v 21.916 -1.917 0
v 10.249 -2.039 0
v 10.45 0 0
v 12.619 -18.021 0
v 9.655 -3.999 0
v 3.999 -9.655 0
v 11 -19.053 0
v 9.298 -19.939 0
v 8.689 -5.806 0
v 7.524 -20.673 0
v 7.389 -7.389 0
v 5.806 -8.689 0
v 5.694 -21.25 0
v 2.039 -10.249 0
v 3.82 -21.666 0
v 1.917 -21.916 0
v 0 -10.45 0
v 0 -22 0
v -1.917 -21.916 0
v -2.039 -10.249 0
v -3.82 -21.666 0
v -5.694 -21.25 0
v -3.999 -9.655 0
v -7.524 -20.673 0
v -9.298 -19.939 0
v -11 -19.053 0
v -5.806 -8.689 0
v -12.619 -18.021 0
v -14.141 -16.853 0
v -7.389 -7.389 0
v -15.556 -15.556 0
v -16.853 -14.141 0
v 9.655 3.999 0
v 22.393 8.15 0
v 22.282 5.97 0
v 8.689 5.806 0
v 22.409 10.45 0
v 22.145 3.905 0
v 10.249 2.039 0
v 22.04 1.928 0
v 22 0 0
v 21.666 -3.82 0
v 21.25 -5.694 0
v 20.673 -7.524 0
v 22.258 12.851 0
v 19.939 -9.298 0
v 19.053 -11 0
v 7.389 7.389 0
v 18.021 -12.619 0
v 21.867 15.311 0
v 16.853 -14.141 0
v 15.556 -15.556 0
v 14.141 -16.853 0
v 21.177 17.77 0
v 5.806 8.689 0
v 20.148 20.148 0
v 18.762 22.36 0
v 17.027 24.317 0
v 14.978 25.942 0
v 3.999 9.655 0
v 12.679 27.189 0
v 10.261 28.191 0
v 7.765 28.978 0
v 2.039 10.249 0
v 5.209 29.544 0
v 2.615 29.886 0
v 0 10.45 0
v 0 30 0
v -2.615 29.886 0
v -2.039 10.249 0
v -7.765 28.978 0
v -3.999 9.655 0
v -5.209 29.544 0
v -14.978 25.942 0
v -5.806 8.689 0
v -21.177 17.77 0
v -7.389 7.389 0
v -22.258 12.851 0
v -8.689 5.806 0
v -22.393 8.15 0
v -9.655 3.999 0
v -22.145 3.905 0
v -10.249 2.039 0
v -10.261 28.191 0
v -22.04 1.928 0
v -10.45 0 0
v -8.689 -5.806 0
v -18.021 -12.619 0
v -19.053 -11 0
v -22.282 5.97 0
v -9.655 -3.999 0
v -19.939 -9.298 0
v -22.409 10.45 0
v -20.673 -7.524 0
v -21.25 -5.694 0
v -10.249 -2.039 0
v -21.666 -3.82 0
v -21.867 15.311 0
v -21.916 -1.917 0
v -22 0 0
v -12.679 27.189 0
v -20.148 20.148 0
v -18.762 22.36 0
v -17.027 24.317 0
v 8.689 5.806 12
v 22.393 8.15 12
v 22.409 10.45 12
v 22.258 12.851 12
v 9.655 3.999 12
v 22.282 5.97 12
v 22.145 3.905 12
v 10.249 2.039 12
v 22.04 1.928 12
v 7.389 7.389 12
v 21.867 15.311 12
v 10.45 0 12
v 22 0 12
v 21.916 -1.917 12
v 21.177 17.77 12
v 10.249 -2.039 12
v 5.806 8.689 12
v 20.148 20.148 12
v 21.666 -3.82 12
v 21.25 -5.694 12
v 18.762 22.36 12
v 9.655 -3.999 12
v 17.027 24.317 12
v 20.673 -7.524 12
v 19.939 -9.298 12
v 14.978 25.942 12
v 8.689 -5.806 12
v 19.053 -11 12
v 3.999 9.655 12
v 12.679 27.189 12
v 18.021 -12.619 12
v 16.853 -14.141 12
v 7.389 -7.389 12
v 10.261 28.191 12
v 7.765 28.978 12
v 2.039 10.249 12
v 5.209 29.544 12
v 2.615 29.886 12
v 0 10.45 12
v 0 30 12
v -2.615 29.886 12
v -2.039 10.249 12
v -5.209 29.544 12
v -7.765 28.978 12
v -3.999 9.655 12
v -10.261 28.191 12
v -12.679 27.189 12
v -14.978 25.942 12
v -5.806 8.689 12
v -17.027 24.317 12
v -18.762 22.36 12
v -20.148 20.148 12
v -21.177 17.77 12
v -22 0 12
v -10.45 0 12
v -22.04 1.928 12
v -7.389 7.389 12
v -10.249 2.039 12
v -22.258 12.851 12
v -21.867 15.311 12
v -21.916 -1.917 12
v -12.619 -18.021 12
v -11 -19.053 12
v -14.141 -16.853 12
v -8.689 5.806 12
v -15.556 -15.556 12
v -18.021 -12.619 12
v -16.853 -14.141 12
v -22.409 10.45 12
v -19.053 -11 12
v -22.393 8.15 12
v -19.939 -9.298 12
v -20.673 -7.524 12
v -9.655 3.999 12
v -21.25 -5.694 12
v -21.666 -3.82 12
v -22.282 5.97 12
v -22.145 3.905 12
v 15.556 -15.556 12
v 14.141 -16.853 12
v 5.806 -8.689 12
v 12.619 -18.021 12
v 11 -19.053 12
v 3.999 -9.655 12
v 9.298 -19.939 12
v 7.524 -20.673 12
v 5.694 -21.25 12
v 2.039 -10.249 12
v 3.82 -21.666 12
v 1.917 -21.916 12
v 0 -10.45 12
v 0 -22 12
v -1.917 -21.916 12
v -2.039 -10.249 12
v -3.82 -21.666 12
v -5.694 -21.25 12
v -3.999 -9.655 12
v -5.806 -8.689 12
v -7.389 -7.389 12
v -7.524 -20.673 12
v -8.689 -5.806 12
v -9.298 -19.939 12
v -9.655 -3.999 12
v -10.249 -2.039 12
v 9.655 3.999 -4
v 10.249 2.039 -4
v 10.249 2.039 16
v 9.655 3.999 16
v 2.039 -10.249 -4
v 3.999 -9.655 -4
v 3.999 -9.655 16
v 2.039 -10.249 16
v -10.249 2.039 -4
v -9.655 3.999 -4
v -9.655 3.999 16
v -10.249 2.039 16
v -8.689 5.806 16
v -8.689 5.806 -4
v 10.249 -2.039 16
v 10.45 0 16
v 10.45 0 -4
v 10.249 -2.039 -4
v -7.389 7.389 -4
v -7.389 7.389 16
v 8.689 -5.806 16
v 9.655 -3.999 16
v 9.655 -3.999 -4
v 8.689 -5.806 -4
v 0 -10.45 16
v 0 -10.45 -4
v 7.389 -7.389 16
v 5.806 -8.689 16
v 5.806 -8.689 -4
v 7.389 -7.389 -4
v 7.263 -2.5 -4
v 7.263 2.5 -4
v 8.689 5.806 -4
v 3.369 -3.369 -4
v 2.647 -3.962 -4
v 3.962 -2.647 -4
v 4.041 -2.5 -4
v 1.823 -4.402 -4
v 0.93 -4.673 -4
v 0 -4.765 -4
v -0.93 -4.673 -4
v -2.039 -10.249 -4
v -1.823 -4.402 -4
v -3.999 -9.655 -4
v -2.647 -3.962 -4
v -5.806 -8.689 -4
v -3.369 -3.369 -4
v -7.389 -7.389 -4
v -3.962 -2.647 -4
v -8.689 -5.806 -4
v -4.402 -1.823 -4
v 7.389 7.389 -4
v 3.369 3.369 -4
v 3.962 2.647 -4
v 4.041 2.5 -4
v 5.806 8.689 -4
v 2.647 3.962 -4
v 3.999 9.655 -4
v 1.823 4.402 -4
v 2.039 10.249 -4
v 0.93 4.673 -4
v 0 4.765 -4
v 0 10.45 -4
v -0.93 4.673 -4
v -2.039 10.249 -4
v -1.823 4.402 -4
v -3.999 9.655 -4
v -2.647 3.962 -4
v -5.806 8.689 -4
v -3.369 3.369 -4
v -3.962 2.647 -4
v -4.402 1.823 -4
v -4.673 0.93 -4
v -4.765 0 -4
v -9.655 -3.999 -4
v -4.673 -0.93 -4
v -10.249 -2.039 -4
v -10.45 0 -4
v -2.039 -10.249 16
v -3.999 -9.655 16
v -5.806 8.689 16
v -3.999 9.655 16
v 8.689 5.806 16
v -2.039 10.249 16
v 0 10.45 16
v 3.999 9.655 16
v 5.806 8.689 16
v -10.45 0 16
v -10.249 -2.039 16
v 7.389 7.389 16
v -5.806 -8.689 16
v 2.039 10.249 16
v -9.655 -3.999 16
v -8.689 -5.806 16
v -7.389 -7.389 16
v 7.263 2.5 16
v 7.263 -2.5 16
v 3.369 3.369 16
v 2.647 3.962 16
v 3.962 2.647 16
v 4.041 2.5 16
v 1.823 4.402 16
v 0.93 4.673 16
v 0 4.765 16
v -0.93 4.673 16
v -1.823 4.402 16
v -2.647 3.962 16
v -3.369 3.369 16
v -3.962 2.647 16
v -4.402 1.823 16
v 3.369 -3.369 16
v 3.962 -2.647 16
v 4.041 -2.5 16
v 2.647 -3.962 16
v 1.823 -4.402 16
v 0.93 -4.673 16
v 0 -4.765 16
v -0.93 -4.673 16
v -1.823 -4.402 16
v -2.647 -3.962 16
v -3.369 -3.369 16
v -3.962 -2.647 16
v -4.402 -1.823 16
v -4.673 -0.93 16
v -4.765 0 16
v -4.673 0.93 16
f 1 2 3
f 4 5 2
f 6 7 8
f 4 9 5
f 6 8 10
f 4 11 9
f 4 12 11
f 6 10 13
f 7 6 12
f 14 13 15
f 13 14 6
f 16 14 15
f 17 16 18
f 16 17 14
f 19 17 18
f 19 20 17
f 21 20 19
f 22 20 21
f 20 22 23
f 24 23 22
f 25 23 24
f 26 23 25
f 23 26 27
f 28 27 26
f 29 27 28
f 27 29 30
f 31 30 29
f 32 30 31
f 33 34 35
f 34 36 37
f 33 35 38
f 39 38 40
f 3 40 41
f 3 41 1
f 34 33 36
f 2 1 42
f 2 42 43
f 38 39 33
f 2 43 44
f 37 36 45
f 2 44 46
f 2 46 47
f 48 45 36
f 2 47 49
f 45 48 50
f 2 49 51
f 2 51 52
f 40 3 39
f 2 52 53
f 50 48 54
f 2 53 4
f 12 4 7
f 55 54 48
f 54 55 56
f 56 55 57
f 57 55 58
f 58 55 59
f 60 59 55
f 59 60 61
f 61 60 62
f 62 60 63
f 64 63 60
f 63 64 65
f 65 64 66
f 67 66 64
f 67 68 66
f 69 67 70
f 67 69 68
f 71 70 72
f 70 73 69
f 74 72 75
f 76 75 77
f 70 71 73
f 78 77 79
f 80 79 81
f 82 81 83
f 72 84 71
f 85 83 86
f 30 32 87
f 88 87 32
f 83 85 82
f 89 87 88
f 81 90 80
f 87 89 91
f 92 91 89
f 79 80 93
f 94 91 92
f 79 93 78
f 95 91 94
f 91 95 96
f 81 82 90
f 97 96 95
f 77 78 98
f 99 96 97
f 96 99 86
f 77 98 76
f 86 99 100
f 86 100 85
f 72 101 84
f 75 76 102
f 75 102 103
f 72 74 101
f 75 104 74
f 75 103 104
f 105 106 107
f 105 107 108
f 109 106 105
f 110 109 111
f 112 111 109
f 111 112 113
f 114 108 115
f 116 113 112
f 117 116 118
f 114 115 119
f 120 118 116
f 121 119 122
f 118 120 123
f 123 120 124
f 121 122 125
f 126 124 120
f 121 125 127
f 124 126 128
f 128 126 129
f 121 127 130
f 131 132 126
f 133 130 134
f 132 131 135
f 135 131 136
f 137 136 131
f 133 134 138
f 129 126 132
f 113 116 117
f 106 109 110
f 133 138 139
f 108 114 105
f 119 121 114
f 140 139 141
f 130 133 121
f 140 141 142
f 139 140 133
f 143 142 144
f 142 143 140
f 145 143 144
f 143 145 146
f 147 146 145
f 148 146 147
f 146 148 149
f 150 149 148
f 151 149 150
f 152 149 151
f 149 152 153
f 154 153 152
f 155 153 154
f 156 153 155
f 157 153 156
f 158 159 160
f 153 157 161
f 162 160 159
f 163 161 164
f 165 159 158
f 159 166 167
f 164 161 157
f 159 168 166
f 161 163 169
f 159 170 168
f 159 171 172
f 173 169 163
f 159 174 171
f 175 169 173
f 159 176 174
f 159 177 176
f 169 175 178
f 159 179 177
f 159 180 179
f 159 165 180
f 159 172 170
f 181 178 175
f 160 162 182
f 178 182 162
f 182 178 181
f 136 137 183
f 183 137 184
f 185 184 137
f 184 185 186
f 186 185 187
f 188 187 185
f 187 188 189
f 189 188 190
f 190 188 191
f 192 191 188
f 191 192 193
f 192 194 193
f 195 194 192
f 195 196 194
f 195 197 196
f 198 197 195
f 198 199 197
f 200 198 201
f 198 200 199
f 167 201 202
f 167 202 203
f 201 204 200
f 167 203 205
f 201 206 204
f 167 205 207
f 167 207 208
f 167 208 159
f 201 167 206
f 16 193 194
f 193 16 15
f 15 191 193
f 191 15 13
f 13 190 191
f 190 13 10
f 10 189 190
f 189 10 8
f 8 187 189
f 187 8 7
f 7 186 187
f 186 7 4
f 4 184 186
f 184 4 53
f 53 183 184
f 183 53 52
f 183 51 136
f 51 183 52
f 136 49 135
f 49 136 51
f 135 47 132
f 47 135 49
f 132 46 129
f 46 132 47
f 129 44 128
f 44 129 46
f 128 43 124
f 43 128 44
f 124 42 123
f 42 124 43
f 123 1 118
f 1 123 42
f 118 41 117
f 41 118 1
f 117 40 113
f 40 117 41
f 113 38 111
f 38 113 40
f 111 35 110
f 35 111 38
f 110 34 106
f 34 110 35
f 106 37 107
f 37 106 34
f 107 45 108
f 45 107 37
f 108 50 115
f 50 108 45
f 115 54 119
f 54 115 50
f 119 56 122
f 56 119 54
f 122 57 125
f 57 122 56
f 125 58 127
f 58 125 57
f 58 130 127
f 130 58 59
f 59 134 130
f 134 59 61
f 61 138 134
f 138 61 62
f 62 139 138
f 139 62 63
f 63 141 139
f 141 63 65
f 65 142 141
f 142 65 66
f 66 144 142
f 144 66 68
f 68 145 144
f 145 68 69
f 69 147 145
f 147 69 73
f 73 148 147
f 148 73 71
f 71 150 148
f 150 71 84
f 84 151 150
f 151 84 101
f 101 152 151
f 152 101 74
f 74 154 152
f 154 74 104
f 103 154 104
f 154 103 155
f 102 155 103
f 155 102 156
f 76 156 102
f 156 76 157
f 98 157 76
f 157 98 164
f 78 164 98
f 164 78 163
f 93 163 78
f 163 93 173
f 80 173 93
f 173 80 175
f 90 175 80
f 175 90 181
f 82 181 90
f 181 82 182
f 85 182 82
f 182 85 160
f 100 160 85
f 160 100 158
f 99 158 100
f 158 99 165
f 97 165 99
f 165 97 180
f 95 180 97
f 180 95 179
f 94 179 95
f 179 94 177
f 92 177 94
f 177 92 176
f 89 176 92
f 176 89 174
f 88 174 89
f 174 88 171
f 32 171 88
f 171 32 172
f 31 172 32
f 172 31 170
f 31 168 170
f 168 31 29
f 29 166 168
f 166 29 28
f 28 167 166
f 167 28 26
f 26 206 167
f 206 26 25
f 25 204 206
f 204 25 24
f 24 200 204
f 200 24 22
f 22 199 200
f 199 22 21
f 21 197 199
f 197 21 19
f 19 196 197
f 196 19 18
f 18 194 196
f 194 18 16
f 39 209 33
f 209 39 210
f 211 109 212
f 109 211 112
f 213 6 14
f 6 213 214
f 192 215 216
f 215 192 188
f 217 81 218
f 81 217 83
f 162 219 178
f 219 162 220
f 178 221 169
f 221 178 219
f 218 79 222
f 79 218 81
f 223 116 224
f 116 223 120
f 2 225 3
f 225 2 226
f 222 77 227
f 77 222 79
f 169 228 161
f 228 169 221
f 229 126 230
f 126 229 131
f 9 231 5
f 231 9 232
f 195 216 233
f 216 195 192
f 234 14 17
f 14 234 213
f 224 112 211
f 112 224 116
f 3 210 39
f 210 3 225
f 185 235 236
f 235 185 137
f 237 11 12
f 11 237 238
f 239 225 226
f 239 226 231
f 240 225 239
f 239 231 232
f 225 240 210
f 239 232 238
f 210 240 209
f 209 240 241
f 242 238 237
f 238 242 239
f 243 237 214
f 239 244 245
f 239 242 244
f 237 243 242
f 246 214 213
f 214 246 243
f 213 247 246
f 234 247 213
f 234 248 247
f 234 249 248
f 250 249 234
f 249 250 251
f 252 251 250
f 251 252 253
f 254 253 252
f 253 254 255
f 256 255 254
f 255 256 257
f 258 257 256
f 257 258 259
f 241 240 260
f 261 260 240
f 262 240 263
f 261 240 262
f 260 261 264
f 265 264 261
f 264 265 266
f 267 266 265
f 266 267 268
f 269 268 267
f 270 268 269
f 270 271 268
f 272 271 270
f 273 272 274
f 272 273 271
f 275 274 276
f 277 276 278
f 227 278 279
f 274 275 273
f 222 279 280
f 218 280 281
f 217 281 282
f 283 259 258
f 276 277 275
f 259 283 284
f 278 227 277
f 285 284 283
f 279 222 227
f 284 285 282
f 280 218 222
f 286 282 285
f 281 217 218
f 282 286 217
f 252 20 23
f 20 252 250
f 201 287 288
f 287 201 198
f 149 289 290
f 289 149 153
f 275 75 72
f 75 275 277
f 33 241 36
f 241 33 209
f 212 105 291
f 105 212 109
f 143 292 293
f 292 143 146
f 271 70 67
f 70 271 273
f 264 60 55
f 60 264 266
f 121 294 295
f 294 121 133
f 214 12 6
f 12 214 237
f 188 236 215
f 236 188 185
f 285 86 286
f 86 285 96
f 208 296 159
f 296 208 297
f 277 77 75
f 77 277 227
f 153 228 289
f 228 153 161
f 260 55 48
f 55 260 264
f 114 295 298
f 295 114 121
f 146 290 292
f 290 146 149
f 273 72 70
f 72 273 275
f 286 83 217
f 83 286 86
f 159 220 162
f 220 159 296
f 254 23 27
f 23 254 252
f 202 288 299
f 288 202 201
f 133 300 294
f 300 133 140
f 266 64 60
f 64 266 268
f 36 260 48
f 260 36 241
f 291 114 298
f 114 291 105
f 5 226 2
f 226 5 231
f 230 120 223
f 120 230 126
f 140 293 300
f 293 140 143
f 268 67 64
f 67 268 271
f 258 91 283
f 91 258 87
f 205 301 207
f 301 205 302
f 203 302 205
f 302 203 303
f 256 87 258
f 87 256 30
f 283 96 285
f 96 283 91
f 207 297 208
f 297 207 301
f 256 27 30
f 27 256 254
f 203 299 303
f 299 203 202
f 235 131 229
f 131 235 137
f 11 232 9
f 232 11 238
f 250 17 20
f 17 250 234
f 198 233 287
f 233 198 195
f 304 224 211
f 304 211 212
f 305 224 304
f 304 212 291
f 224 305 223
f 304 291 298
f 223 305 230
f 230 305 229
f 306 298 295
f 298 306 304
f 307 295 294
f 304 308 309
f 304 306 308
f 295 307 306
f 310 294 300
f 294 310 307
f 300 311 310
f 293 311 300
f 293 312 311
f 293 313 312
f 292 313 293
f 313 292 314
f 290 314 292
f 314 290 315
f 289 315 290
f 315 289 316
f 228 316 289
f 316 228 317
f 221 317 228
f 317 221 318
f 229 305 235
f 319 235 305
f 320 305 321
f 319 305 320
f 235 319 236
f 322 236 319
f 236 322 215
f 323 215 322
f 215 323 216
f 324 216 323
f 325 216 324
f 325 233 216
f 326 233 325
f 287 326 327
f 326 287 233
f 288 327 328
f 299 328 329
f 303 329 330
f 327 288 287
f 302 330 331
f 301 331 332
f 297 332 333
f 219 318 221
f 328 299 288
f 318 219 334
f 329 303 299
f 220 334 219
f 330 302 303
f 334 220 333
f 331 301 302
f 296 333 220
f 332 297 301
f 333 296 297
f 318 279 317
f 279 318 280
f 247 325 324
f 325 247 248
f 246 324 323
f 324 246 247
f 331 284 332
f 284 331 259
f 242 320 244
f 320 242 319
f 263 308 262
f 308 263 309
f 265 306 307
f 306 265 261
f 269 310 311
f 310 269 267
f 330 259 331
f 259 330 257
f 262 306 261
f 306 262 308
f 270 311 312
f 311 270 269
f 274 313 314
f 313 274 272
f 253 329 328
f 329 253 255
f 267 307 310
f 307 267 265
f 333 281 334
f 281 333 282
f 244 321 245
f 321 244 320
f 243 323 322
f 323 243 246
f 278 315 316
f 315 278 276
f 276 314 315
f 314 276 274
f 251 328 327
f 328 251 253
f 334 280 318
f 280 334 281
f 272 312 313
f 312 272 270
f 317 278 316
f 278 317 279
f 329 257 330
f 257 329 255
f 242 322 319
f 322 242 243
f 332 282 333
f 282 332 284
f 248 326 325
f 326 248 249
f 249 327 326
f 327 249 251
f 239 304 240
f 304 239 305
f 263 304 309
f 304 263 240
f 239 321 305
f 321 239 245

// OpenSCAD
$fn = 32;

// ----------------------------------------------------------------------
// Cam: base radius 22 mm with a 8 mm lift over 180 degrees
// ----------------------------------------------------------------------

// --- parameters (mm) ---
base_r = 22;              // base radius
lift = 8;                 // lift height above the base radius
lift_span = 180;          // angular width of the lift
lift_start = 0;           // angle where the lift starts
cam_t = 12;               // cam plate thickness
hub_d = 20.9;             // hub diameter
hub_h = 20;               // hub height
bore_d = 9.53;            // bore
key_w = 5;                // keyway width
key_depth = 2.5;          // keyway depth

cam_profile = [[22, 0], [22.04, 1.928], [22.145, 3.905], [22.282, 5.97], [22.393, 8.15], [22.409, 10.45], [22.258, 12.851], [21.867, 15.311], [21.177, 17.77], [20.148, 20.148], [18.762, 22.36], [17.027, 24.317], [14.978, 25.942], [12.679, 27.189], [10.261, 28.191], [7.765, 28.978], [5.209, 29.544], [2.615, 29.886], [0, 30], [-2.615, 29.886], [-5.209, 29.544], [-7.765, 28.978], [-10.261, 28.191], [-12.679, 27.189], [-14.978, 25.942], [-17.027, 24.317], [-18.762, 22.36], [-20.148, 20.148], [-21.177, 17.77], [-21.867, 15.311], [-22.258, 12.851], [-22.409, 10.45], [-22.393, 8.15], [-22.282, 5.97], [-22.145, 3.905], [-22.04, 1.928], [-22, 0], [-21.916, -1.917], [-21.666, -3.82], [-21.25, -5.694], [-20.673, -7.524], [-19.939, -9.298], [-19.053, -11], [-18.021, -12.619], [-16.853, -14.141], [-15.556, -15.556], [-14.141, -16.853], [-12.619, -18.021], [-11, -19.053], [-9.298, -19.939], [-7.524, -20.673], [-5.694, -21.25], [-3.82, -21.666], [-1.917, -21.916], [0, -22], [1.917, -21.916], [3.82, -21.666], [5.694, -21.25], [7.524, -20.673], [9.298, -19.939], [11, -19.053], [12.619, -18.021], [14.141, -16.853], [15.556, -15.556], [16.853, -14.141], [18.021, -12.619], [19.053, -11], [19.939, -9.298], [20.673, -7.524], [21.25, -5.694], [21.666, -3.82], [21.916, -1.917]];

difference() {
  union() {
    linear_extrude(height = cam_t) polygon(cam_profile);
    /* hub, proud of the cam plate on both sides */
    translate([0, 0, -4]) cylinder(h = hub_h, d = hub_d);
  }
  /* bore through the hub, 2.5 mm clear on both faces */
  translate([0, 0, -6.5]) cylinder(h = hub_h + 5, d = bore_d);
  /* keyway, milled through the whole hub */
  translate([2.263, -2.5, -6.5]) cube([5, 5, 25]);
}
